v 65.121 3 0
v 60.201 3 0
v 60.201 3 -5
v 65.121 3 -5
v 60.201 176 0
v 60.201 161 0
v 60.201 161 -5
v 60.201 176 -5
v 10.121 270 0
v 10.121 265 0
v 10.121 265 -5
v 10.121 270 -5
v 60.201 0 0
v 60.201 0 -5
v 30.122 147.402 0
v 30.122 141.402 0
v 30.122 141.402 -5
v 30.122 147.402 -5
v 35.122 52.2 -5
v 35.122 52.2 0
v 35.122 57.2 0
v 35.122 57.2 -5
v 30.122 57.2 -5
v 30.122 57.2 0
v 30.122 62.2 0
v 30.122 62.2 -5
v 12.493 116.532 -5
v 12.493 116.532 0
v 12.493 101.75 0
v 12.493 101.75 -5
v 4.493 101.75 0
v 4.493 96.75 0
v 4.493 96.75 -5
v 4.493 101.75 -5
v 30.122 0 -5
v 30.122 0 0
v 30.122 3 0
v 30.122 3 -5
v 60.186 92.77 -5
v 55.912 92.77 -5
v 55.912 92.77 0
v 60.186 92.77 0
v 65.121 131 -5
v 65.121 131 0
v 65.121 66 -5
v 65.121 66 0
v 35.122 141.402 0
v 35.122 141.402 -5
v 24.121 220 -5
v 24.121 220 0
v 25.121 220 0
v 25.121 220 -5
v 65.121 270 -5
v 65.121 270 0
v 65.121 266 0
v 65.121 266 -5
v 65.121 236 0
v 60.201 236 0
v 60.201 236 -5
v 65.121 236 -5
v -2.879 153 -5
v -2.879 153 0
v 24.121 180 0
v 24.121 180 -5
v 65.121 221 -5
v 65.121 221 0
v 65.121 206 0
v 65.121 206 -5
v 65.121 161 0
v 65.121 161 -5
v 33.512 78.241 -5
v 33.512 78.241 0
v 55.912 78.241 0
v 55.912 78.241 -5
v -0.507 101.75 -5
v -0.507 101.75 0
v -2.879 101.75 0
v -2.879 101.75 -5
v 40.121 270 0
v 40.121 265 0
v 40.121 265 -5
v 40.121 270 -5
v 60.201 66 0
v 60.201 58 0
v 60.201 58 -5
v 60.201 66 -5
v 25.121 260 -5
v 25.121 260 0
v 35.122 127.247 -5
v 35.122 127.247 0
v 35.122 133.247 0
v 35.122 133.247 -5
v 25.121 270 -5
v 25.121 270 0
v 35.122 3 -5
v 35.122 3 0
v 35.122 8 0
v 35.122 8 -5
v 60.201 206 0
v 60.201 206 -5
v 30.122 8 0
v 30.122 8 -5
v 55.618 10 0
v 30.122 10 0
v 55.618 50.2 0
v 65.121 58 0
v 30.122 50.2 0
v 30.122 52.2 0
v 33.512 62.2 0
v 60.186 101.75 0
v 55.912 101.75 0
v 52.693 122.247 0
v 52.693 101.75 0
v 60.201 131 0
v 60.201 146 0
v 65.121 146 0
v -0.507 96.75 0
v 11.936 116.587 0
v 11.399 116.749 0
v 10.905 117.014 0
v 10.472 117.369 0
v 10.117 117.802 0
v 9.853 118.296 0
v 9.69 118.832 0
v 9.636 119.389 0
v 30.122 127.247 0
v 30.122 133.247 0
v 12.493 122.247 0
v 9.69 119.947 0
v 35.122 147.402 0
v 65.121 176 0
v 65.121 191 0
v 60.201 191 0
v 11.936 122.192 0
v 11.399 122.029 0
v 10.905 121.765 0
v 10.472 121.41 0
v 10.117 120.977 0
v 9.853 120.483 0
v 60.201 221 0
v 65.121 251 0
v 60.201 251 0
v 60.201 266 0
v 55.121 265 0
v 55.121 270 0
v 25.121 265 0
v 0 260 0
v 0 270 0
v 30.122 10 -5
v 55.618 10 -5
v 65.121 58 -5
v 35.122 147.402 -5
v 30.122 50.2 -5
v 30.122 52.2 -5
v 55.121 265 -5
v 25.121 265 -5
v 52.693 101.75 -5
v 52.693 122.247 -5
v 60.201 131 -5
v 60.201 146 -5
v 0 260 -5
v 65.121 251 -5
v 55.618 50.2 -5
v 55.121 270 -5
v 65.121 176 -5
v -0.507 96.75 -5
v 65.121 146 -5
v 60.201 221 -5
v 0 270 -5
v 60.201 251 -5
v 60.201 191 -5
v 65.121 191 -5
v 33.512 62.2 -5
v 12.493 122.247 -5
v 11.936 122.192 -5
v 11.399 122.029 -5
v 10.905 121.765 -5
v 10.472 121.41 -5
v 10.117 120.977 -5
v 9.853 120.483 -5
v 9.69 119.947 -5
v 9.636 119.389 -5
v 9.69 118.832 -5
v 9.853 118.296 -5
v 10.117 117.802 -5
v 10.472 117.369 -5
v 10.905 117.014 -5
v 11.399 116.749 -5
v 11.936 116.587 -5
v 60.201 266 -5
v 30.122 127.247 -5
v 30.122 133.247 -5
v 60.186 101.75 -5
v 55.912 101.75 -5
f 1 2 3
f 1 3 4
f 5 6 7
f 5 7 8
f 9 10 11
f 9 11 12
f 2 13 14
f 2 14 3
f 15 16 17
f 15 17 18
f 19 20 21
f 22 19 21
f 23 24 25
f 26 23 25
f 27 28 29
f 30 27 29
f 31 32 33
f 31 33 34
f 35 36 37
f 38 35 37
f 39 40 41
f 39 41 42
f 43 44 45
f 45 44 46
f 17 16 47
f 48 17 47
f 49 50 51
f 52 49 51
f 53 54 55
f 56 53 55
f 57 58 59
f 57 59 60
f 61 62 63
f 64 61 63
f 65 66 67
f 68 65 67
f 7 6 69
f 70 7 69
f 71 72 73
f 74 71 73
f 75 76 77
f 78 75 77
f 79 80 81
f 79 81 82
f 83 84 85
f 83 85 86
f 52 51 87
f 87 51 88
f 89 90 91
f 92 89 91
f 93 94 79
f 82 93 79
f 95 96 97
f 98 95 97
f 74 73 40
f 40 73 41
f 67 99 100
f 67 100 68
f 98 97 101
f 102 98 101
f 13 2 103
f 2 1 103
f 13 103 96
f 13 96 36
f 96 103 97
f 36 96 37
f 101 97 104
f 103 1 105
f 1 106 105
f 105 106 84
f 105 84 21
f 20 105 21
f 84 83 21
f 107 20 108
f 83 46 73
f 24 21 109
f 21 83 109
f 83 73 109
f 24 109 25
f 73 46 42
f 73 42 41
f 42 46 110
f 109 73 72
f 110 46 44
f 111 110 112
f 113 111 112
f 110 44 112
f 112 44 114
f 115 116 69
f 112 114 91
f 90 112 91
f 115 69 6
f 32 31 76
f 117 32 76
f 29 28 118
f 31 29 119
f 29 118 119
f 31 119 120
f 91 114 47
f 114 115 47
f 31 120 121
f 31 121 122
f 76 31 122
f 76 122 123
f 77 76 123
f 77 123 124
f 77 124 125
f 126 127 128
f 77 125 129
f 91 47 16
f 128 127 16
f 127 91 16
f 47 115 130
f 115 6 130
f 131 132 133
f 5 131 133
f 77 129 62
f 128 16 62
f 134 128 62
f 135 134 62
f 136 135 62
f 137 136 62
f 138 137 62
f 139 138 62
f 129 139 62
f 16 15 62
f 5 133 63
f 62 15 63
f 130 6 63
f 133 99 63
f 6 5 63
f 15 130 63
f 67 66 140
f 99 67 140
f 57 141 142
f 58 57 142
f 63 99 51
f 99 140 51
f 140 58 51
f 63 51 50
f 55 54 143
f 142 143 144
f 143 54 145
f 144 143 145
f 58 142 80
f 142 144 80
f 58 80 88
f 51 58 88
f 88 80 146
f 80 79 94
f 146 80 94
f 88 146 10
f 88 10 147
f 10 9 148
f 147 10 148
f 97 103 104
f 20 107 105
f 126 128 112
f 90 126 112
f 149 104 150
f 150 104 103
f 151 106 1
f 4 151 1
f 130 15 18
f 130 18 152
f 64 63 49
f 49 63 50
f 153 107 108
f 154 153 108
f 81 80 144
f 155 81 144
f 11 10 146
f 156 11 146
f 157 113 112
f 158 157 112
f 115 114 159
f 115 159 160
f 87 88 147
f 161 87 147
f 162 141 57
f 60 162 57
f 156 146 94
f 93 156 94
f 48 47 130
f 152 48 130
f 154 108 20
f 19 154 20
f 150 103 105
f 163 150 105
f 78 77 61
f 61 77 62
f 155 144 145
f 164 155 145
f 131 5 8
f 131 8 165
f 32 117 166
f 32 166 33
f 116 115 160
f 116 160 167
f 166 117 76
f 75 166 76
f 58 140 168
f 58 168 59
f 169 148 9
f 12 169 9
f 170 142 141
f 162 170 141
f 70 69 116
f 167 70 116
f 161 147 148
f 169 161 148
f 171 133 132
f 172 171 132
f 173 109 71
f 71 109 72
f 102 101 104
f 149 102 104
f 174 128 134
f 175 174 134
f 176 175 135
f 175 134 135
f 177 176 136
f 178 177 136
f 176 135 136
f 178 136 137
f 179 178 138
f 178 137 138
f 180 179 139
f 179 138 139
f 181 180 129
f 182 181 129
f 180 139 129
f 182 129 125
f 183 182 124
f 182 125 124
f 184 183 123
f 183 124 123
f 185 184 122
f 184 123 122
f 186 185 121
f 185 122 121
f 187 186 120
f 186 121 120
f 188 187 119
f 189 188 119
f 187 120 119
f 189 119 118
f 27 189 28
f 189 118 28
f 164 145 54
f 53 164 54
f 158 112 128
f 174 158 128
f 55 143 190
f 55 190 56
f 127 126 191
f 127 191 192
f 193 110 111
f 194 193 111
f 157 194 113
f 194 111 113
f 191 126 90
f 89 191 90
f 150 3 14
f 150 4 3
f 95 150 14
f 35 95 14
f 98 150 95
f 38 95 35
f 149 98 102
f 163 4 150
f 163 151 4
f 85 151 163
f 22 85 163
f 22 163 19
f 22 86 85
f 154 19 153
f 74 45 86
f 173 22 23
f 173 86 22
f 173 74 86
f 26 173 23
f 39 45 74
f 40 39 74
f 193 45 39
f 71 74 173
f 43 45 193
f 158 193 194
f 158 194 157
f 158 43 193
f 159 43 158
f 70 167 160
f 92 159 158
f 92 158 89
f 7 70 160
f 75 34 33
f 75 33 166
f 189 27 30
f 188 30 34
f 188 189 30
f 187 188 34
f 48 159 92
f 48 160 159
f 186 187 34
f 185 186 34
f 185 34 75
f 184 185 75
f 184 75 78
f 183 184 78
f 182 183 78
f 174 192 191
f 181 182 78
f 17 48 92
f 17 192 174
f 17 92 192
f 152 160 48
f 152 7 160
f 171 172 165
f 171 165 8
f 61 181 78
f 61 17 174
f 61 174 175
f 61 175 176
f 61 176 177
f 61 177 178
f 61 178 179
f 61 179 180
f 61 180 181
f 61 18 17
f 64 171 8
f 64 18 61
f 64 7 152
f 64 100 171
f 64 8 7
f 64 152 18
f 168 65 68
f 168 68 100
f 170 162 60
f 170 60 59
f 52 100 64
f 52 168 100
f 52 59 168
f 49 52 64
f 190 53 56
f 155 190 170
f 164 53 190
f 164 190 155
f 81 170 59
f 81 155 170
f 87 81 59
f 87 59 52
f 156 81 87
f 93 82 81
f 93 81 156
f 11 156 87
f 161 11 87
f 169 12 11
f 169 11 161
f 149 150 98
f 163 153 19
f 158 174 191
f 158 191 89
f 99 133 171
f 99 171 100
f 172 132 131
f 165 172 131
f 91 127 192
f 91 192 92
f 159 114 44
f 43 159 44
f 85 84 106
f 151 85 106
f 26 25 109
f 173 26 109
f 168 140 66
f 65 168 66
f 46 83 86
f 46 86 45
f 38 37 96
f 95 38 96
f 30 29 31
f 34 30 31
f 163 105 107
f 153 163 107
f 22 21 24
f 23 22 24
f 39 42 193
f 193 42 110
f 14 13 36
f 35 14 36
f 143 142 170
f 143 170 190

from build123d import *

# Parameters (mm, degrees)
BOSS_EXTRU_1_DEPTH      = 5
ESQUISSE2_R             = 2.8575
ESQUISSE2_W             = 5
ESQUISSE2_H             = 6
ESQUISSE2_W_2           = 4.274370263
ESQUISSE2_H_2           = 8.980069935
ESQUISSE2_W_3           = 4.92
ESQUISSE2_H_3           = 3
ESQUISSE2_H_4           = 8
ESQUISSE2_H_5           = 15
ESQUISSE2_W_4           = 15
ESQUISSE2_H_6           = 5
ESQUISSE2_W_5           = 1
ESQUISSE2_H_7           = 40
ENL_V_MAT_EXTRU_1_DEPTH = 5
ESQUISSE3_W             = 5
ESQUISSE3_H             = 5
BOSS_EXTRU_2_DEPTH      = 5


with BuildPart() as part:
    # Esquisse1 → Boss.-Extru.1 (new body)
    with BuildSketch(Plane.XY):
        Polygon((65.121094869, 0), (30.122364869, 0), (30.122364869, 3), (35.122364869, 3), (35.122364869, 8), (30.122364869, 8), (30.122364869, 10), (55.617614869, 10), (55.617614869, 50.2), (30.122364869, 50.2), (30.122364869, 52.2), (35.122364869, 52.2), (35.122364869, 57.2), (30.122364869, 57.2), (30.122364869, 62.2), (33.512280837, 62.2), (33.512280837, 78.240708175), (55.911629737, 78.240708175), (55.911629737, 101.750434868), (52.693, 101.750434868), (52.693, 122.246954868), (12.493, 122.246954868), (12.493, 101.750434868), (-2.878905131, 101.750434868), (-2.878905131, 153), (24.121094869, 180), (24.121094869, 260), (0, 260), (0, 270), (65.121094869, 270), align=None)
    extrude(amount=-BOSS_EXTRU_1_DEPTH)

    # Esquisse2 → Enlèv. mat.-Extru.1 (cut)
    with BuildSketch(Plane.XY):
        with Locations((12.493, 119.389454868)):
            Circle(ESQUISSE2_R)
        with Locations((32.622364869, 144.401636706)):
            Rectangle(ESQUISSE2_W, ESQUISSE2_H)
        with Locations((32.622364869, 130.246954868)):
            Rectangle(ESQUISSE2_W, ESQUISSE2_H)
        with Locations((58.048814869, 97.260399901)):
            Rectangle(ESQUISSE2_W_2, ESQUISSE2_H_2)
        with Locations((62.661094869, 1.5)):
            Rectangle(ESQUISSE2_W_3, ESQUISSE2_H_3)
        with Locations((62.661094869, 62)):
            Rectangle(ESQUISSE2_W_3, ESQUISSE2_H_4)
        with Locations((62.661094869, 168.5)):
            Rectangle(ESQUISSE2_W_3, ESQUISSE2_H_5)
        with Locations((62.661094869, 138.5)):
            Rectangle(ESQUISSE2_W_3, ESQUISSE2_H_5)
        with Locations((62.661094869, 198.5)):
            Rectangle(ESQUISSE2_W_3, ESQUISSE2_H_5)
        with Locations((62.661094869, 228.5)):
            Rectangle(ESQUISSE2_W_3, ESQUISSE2_H_5)
        with Locations((62.661094869, 258.5)):
            Rectangle(ESQUISSE2_W_3, ESQUISSE2_H_5)
        with Locations((47.621094869, 267.5)):
            Rectangle(ESQUISSE2_W_4, ESQUISSE2_H_6)
        with Locations((17.621094869, 267.5)):
            Rectangle(ESQUISSE2_W_4, ESQUISSE2_H_6)
        with Locations((24.621094869, 240)):
            Rectangle(ESQUISSE2_W_5, ESQUISSE2_H_7)
    extrude(amount=-ENL_V_MAT_EXTRU_1_DEPTH, mode=Mode.SUBTRACT)

    # Esquisse3 → Boss.-Extru.2 (add)
    with BuildSketch(Plane.XY):
        with Locations((1.993, 99.250434868)):
            Rectangle(ESQUISSE3_W, ESQUISSE3_H)
    extrude(amount=-BOSS_EXTRU_2_DEPTH)


solid = part.part
